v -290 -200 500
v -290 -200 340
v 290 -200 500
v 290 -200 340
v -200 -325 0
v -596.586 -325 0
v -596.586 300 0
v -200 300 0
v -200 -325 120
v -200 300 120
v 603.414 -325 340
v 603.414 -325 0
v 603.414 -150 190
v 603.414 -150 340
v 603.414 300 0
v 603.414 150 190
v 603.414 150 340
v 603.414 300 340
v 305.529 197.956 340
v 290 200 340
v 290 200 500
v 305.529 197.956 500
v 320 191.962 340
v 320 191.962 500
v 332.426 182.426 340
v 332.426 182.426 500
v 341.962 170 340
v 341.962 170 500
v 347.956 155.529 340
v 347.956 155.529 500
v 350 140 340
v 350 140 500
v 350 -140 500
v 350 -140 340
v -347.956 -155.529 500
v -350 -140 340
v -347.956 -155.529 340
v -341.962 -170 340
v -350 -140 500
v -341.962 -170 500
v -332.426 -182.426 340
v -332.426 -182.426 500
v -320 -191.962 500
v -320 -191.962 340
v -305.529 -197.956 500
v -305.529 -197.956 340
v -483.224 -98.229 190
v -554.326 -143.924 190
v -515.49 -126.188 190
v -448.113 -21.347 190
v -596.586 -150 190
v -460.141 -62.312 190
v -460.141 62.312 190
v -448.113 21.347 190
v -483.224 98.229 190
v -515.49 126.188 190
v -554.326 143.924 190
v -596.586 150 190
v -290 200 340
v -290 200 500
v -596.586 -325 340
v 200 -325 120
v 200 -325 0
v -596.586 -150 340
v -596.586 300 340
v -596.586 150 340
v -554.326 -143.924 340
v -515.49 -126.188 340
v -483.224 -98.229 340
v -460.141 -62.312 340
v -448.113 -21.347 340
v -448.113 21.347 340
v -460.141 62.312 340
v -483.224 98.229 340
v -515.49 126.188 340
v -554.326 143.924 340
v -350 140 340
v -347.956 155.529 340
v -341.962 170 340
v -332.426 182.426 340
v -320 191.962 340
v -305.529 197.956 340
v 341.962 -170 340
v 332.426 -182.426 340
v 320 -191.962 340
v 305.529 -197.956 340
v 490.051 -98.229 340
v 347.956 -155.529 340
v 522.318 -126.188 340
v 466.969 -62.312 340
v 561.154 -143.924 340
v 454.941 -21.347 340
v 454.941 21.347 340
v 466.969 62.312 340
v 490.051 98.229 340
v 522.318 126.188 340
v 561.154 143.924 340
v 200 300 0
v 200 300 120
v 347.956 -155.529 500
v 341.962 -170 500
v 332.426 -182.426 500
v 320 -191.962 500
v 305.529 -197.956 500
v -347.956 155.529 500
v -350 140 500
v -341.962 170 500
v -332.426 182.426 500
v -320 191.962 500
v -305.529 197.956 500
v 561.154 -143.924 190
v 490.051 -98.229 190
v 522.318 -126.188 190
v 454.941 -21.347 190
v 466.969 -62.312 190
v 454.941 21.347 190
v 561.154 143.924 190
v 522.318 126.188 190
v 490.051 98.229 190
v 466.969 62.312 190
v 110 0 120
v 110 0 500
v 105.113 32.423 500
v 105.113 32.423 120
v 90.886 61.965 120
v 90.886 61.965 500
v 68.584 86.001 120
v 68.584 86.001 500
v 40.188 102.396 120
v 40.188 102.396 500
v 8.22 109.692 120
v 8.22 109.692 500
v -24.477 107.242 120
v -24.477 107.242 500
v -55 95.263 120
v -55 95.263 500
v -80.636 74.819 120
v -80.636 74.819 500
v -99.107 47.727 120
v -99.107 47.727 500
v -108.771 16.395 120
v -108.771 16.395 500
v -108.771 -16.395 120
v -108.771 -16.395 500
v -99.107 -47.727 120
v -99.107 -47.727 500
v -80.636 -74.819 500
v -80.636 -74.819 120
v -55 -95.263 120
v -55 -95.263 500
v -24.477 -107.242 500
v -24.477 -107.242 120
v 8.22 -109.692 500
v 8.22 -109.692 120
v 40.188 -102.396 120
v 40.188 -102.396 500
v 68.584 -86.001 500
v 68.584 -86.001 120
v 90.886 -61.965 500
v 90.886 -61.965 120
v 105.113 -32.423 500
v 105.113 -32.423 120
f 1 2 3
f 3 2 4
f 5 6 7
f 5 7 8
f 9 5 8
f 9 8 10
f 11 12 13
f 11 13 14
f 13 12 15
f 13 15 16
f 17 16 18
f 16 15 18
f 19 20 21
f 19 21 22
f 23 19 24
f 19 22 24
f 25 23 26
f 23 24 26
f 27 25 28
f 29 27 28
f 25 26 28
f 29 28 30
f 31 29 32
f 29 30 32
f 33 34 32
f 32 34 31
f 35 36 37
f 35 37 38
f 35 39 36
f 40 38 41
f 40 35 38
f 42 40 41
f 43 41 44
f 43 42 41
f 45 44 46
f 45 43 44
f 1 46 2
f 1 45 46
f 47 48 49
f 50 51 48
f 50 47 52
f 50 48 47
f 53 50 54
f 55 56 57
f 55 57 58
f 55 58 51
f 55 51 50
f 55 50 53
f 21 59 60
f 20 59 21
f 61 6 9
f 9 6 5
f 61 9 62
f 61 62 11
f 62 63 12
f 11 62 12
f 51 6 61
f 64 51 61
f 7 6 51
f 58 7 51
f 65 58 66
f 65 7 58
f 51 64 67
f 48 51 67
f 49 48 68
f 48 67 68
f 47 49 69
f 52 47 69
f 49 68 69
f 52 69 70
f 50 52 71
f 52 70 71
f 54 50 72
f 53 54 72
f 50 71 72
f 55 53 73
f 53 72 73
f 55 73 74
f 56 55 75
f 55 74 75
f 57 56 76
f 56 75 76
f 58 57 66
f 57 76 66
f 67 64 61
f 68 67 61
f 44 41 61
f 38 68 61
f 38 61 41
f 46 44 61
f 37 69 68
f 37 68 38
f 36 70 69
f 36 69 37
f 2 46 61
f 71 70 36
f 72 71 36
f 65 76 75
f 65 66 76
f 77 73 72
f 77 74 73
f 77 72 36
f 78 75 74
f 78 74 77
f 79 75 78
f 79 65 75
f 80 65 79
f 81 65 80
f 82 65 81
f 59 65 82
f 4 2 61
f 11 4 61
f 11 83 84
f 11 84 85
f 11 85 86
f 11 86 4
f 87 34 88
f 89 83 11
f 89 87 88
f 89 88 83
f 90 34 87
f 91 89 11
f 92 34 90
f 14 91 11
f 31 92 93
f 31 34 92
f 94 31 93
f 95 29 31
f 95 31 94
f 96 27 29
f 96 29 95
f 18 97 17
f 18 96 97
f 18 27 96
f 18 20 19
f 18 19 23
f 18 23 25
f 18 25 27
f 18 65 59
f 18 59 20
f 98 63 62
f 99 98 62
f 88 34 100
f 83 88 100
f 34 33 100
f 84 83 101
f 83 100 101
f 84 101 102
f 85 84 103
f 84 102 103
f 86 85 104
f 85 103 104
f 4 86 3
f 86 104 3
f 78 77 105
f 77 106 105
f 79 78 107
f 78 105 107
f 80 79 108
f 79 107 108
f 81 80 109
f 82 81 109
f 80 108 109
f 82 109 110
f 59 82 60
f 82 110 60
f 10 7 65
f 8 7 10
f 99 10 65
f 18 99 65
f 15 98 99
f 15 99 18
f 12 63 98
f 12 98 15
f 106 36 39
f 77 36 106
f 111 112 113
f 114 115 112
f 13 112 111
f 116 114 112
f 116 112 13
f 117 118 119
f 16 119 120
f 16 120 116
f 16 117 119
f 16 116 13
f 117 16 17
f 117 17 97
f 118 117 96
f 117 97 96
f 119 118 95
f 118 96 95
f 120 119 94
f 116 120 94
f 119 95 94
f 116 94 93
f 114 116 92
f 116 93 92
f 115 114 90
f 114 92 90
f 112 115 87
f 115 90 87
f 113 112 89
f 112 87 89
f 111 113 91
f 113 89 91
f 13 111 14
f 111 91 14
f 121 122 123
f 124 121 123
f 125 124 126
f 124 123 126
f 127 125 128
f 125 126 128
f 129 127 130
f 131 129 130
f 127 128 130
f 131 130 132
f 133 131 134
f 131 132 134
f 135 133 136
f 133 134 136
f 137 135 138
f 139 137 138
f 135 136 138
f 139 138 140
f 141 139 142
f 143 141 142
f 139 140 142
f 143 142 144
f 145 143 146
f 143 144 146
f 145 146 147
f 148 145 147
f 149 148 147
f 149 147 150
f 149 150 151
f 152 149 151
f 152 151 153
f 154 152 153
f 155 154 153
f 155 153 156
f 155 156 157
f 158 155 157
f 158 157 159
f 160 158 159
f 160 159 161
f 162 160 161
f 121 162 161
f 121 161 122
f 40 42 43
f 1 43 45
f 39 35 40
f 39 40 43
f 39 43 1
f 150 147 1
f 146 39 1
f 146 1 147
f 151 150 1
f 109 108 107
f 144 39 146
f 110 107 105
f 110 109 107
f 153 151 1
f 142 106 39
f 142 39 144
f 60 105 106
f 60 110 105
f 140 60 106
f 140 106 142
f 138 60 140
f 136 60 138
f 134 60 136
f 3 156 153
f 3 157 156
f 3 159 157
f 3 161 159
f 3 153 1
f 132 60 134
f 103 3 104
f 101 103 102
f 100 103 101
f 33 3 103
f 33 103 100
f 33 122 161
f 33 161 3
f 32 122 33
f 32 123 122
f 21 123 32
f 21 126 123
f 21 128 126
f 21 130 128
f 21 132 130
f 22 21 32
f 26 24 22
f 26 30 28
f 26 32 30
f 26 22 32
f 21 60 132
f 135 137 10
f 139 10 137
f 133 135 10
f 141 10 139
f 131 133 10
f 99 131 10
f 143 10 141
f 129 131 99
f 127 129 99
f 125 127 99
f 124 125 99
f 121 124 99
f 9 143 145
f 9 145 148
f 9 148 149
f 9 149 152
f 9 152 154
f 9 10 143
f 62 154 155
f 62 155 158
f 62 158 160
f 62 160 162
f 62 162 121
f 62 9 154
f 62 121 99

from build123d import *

# Parameters (mm, degrees)
F0_W      = 1200
F0_H      = 600
F1_DEPTH  = 340
F3_DEPTH  = 150
F5_DEPTH  = 150
F6_W      = 700
F6_H      = 400
F7_DEPTH  = 160
F8_R      = 110
F9_DEPTH  = 500.001
F10_DEPTH = 25
F11_W     = 400
F11_H     = 120
F12_DEPTH = 625.001
F13_R     = 60


with BuildPart() as f1:
    # F0 (on Top) → F1 (new body)
    with BuildSketch(Plane.XY):
        with Locations((3.413781058, 0)):
            Rectangle(F0_W, F0_H)
    extrude(amount=F1_DEPTH)

    # F2 (on face) → F3 (cut)
    with BuildSketch(Plane.XY.offset(340)):
        with BuildLine():
            ThreePointArc((-596.586218942, -150), (-490.520201764, -106.066017178), (-446.586218942, 0))
            ThreePointArc((-446.586218942, 0), (-490.520201764, 106.066017178), (-596.586218942, 150))
            Line((-596.586218942, 150), (-596.586218942, -150))
        make_face()
    extrude(amount=-F3_DEPTH, mode=Mode.SUBTRACT)

    # F4 (on face) → F5 (cut)
    with BuildSketch(Plane.XY.offset(340)):
        with BuildLine():
            Line((603.413781058, -150), (603.413781058, 150))
            ThreePointArc((603.413781058, 150), (453.413781058, 0), (603.413781058, -150))
        make_face()
    extrude(amount=-F5_DEPTH, mode=Mode.SUBTRACT)

    # F6 (on face) → F7 (join)
    with BuildSketch(Plane.XY.offset(340)):
        Rectangle(F6_W, F6_H)
    extrude(amount=F7_DEPTH)

    # F8 (on face) → F9 (cut, through all)
    with BuildSketch(Plane.XY.offset(500)):
        Circle(F8_R)
    extrude(amount=-F9_DEPTH, mode=Mode.SUBTRACT)

    # F10 (add): a face of the model
    f10_faces = [f1.faces().sort_by_distance(p)[0] for p in [
        (3.413781058, -300, 170),
    ]]
    extrude(f10_faces, amount=F10_DEPTH)

    # F11 (on face) → F12 (cut, through all)
    with BuildSketch(Plane.XZ.offset(325)):
        with Locations((0, 60)):
            Rectangle(F11_W, F11_H)
    extrude(amount=-F12_DEPTH, mode=Mode.SUBTRACT)

    # F13
    f13_edges = [f1.edges().sort_by_distance(p)[0] for p in [
        (-350, -200, 420),
        (350, -200, 420),
        (350, 200, 420),
        (-350, 200, 420),
    ]]
    fillet(f13_edges, radius=F13_R)


solid = f1.part
